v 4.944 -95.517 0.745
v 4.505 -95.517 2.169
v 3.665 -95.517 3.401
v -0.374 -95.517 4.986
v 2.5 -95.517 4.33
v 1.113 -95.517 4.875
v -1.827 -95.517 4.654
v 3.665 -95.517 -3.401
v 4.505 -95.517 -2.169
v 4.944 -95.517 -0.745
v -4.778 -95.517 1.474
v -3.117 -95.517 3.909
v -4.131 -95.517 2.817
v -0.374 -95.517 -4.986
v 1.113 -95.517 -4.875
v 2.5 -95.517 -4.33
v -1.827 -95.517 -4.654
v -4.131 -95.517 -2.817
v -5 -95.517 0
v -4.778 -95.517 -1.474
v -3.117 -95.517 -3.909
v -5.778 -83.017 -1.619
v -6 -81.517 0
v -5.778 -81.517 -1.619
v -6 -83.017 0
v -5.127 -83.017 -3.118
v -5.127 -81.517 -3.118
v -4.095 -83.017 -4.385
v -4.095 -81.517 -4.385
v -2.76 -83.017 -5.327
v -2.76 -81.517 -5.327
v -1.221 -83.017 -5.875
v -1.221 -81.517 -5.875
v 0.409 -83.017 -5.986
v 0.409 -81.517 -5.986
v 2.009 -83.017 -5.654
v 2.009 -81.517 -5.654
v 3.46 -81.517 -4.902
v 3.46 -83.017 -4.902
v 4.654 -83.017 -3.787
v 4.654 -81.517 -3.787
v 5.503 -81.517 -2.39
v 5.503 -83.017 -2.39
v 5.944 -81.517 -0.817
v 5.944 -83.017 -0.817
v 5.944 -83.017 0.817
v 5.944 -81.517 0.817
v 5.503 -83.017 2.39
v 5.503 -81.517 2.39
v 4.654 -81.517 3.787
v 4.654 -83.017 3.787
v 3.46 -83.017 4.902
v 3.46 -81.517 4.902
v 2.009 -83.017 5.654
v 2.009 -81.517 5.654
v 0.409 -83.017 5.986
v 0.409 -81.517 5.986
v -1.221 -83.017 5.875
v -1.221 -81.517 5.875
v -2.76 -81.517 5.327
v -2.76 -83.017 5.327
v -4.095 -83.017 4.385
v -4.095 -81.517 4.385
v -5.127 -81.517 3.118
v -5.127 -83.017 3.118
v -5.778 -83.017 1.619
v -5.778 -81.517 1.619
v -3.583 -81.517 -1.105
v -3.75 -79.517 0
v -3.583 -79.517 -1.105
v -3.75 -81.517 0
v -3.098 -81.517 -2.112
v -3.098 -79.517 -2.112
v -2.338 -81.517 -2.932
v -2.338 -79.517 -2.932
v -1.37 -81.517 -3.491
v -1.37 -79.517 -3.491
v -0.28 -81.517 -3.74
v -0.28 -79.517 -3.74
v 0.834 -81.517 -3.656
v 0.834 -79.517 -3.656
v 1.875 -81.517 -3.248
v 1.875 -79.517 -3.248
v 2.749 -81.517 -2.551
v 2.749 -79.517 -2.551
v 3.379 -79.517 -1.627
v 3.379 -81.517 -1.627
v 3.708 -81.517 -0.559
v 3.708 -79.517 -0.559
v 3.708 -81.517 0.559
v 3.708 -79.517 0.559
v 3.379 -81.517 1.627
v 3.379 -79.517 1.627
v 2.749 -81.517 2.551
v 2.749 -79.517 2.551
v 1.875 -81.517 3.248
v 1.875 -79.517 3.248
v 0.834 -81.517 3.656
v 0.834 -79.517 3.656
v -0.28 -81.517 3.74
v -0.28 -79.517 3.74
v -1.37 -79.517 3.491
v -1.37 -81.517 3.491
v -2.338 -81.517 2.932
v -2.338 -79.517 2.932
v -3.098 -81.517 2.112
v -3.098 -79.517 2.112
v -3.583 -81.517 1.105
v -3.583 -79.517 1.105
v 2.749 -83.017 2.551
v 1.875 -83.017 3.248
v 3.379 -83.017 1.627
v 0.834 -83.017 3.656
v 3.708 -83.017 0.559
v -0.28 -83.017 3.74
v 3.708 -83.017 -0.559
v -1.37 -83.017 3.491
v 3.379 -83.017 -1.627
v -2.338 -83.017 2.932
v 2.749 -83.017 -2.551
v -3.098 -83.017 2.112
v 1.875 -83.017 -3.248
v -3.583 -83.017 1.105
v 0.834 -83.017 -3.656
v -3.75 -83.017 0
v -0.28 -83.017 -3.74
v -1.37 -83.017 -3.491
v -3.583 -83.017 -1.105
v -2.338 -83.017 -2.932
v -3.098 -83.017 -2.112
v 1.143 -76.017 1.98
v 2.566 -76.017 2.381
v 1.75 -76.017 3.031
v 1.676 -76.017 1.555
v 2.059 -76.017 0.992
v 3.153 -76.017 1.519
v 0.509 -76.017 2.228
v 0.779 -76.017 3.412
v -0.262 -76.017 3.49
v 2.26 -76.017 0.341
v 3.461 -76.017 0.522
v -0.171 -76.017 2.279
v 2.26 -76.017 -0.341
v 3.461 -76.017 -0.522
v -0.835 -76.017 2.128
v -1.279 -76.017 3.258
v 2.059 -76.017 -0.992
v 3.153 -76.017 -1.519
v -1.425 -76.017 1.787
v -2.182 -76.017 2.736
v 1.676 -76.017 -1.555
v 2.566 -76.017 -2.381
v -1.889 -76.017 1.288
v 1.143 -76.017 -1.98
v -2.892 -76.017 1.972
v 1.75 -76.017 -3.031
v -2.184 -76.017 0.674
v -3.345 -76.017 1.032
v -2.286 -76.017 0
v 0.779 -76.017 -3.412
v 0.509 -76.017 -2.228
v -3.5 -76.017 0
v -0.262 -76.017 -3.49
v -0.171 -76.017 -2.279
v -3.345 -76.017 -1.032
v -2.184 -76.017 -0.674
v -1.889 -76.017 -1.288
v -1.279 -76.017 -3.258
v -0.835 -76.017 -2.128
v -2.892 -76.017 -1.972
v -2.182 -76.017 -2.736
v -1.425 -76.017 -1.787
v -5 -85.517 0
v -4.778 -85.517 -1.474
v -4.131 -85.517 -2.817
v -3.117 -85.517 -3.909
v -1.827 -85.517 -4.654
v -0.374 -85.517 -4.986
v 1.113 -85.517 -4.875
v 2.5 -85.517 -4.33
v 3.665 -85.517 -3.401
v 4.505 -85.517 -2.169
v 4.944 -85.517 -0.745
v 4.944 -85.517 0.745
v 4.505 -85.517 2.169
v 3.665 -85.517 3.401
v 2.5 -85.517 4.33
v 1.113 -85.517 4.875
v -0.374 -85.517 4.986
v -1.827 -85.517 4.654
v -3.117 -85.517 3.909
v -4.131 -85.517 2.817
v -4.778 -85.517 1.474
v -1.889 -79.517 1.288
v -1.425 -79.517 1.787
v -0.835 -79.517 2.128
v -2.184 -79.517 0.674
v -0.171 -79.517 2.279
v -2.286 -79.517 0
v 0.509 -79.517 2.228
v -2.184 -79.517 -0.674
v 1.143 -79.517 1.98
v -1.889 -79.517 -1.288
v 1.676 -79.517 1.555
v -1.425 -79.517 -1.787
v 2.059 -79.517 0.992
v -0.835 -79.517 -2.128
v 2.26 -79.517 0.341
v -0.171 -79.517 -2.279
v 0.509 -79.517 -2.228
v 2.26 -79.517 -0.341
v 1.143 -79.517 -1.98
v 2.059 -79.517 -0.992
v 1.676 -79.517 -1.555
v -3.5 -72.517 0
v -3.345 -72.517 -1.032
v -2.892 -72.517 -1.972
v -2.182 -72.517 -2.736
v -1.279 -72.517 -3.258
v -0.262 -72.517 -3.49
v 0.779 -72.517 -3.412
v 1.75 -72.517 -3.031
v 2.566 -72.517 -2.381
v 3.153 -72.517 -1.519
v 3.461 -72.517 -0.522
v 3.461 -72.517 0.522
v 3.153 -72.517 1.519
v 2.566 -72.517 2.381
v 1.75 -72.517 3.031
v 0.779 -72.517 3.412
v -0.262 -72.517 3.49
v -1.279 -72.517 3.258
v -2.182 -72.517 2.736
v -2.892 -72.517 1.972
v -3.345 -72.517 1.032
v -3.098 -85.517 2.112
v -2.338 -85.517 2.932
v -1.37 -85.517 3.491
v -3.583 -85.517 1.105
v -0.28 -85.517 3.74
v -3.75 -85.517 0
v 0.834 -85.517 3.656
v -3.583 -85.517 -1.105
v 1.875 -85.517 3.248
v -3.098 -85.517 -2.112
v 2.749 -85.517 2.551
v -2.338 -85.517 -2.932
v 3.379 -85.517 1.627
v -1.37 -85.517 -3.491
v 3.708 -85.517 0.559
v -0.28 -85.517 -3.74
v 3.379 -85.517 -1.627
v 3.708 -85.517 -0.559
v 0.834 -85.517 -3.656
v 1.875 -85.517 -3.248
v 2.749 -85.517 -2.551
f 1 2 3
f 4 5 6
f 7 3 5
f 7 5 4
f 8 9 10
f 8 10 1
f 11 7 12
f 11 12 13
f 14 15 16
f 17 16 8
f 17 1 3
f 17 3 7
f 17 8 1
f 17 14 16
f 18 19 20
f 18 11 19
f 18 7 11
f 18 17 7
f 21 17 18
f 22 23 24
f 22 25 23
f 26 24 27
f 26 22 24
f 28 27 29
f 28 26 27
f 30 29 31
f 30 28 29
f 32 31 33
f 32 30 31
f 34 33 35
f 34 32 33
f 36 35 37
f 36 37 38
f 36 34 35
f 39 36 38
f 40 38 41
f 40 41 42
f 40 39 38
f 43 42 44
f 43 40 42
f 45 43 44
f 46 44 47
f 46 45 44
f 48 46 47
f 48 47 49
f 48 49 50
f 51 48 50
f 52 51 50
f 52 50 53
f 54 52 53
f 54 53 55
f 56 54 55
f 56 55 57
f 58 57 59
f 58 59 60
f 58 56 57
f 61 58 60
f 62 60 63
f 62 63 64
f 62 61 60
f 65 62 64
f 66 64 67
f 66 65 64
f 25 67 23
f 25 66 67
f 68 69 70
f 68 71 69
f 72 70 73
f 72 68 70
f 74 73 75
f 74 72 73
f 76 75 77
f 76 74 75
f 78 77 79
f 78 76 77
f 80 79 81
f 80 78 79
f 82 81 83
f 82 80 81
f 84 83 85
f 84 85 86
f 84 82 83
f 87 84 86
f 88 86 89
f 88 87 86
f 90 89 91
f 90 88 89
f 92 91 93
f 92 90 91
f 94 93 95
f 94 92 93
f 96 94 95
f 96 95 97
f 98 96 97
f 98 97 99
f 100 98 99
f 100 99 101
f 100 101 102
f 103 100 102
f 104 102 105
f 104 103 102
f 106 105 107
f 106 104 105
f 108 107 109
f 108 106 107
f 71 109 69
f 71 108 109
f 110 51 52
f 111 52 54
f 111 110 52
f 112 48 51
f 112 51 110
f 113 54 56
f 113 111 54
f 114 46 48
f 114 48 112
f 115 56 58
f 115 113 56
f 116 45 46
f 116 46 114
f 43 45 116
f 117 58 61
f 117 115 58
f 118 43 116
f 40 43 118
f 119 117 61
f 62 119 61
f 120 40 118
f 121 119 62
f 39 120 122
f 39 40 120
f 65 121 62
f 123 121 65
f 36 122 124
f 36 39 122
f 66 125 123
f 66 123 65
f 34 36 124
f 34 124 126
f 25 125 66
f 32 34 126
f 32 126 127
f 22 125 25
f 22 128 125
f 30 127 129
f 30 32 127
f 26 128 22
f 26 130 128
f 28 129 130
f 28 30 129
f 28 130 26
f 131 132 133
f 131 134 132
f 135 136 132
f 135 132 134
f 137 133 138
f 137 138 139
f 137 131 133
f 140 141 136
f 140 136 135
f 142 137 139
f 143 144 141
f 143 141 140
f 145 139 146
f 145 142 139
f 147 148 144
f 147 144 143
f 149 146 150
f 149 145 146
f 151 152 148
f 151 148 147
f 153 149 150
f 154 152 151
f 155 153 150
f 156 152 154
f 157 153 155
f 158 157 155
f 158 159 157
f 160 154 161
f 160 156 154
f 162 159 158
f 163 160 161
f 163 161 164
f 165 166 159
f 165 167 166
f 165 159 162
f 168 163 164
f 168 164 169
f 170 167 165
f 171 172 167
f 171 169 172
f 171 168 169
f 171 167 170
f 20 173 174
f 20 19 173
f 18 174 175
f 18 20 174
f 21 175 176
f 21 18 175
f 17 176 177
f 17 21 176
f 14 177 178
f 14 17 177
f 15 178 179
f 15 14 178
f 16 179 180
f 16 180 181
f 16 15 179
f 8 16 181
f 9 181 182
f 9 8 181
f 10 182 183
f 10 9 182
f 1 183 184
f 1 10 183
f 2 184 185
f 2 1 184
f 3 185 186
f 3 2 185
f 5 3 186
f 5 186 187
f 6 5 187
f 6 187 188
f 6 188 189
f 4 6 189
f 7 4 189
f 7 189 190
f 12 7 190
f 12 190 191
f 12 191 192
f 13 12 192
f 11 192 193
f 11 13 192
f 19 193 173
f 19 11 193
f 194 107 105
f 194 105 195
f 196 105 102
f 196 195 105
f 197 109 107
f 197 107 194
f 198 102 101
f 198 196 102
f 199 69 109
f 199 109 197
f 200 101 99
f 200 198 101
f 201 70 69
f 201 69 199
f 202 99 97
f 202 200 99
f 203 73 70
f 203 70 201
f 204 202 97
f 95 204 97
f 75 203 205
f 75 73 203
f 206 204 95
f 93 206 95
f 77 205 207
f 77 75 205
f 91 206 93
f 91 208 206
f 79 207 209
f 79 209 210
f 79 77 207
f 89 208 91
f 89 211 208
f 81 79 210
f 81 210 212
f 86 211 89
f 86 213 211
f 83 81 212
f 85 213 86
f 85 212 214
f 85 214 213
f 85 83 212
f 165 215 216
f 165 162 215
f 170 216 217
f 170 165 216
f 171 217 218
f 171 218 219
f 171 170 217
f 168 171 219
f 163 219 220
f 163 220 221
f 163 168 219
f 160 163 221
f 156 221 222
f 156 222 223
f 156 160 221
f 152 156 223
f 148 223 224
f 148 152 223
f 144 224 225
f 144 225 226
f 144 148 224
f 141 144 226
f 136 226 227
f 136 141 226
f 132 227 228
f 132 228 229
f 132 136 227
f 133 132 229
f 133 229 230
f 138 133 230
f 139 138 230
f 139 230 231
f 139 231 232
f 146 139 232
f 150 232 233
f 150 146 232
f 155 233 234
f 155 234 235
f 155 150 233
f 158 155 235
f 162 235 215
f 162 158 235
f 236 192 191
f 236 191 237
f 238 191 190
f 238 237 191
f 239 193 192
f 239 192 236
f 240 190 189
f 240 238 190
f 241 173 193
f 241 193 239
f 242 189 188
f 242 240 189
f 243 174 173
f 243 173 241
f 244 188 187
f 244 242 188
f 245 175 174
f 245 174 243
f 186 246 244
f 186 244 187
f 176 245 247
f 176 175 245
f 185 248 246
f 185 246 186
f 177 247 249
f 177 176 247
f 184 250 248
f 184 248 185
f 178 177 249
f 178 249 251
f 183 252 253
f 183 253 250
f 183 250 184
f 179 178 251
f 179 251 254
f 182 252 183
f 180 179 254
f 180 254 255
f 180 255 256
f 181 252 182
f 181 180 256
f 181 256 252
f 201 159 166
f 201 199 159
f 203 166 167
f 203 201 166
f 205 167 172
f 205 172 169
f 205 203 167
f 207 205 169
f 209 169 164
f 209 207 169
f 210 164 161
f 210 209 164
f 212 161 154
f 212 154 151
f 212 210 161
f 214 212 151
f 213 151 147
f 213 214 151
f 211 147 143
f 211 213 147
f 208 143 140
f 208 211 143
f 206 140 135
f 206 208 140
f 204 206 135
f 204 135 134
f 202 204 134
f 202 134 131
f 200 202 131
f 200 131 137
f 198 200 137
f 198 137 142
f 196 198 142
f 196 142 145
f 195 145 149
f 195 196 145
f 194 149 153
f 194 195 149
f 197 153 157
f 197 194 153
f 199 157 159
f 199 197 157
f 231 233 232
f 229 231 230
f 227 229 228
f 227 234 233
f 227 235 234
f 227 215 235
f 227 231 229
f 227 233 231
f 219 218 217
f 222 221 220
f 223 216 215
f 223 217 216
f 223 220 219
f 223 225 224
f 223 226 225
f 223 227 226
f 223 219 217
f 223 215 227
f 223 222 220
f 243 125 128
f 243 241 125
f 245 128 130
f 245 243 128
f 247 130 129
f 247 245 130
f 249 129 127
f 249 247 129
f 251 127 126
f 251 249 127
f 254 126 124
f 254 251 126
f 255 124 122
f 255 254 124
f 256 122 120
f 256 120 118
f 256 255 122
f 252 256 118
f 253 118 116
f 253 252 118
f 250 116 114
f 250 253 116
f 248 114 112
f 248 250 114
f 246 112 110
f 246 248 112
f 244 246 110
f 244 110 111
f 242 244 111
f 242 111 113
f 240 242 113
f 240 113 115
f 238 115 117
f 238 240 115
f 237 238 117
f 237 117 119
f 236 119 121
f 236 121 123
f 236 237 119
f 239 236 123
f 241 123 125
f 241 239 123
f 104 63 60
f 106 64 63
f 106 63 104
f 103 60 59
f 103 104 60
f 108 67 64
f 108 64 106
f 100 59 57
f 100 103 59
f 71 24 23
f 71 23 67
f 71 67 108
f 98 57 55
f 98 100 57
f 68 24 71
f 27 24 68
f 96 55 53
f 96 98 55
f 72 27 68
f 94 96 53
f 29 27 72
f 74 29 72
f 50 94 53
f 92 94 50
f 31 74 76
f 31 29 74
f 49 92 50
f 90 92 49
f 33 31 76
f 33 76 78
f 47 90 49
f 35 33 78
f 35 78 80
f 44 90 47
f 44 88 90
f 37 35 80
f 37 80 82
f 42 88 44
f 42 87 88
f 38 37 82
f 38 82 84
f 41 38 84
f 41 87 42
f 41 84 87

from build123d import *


with BuildPart() as part:
    # Esquisse1 → Révolution1 (revolve)
    with BuildSketch(Plane.XY, mode=Mode.PRIVATE) as r_volution1_sk:
        Polygon((0, -72.517220377), (3.5, -72.517220377), (3.5, -76.017220377), (2.2857838, -76.017220377), (2.2857838, -79.517220377), (3.75, -79.517220377), (3.75, -81.517220377), (6, -81.517220377), (6, -83.017220377), (3.75, -83.017220377), (3.75, -85.517220377), (5, -85.517220377), (5, -95.517220377), (0, -95.517220377), align=None)
    revolve(r_volution1_sk.sketch.rotate(Axis((0, -72.517220377, 0), (0, -1, 0)), 180), axis=Axis((0, -72.517220377, 0), (0, -1, 0)))


solid = part.part
